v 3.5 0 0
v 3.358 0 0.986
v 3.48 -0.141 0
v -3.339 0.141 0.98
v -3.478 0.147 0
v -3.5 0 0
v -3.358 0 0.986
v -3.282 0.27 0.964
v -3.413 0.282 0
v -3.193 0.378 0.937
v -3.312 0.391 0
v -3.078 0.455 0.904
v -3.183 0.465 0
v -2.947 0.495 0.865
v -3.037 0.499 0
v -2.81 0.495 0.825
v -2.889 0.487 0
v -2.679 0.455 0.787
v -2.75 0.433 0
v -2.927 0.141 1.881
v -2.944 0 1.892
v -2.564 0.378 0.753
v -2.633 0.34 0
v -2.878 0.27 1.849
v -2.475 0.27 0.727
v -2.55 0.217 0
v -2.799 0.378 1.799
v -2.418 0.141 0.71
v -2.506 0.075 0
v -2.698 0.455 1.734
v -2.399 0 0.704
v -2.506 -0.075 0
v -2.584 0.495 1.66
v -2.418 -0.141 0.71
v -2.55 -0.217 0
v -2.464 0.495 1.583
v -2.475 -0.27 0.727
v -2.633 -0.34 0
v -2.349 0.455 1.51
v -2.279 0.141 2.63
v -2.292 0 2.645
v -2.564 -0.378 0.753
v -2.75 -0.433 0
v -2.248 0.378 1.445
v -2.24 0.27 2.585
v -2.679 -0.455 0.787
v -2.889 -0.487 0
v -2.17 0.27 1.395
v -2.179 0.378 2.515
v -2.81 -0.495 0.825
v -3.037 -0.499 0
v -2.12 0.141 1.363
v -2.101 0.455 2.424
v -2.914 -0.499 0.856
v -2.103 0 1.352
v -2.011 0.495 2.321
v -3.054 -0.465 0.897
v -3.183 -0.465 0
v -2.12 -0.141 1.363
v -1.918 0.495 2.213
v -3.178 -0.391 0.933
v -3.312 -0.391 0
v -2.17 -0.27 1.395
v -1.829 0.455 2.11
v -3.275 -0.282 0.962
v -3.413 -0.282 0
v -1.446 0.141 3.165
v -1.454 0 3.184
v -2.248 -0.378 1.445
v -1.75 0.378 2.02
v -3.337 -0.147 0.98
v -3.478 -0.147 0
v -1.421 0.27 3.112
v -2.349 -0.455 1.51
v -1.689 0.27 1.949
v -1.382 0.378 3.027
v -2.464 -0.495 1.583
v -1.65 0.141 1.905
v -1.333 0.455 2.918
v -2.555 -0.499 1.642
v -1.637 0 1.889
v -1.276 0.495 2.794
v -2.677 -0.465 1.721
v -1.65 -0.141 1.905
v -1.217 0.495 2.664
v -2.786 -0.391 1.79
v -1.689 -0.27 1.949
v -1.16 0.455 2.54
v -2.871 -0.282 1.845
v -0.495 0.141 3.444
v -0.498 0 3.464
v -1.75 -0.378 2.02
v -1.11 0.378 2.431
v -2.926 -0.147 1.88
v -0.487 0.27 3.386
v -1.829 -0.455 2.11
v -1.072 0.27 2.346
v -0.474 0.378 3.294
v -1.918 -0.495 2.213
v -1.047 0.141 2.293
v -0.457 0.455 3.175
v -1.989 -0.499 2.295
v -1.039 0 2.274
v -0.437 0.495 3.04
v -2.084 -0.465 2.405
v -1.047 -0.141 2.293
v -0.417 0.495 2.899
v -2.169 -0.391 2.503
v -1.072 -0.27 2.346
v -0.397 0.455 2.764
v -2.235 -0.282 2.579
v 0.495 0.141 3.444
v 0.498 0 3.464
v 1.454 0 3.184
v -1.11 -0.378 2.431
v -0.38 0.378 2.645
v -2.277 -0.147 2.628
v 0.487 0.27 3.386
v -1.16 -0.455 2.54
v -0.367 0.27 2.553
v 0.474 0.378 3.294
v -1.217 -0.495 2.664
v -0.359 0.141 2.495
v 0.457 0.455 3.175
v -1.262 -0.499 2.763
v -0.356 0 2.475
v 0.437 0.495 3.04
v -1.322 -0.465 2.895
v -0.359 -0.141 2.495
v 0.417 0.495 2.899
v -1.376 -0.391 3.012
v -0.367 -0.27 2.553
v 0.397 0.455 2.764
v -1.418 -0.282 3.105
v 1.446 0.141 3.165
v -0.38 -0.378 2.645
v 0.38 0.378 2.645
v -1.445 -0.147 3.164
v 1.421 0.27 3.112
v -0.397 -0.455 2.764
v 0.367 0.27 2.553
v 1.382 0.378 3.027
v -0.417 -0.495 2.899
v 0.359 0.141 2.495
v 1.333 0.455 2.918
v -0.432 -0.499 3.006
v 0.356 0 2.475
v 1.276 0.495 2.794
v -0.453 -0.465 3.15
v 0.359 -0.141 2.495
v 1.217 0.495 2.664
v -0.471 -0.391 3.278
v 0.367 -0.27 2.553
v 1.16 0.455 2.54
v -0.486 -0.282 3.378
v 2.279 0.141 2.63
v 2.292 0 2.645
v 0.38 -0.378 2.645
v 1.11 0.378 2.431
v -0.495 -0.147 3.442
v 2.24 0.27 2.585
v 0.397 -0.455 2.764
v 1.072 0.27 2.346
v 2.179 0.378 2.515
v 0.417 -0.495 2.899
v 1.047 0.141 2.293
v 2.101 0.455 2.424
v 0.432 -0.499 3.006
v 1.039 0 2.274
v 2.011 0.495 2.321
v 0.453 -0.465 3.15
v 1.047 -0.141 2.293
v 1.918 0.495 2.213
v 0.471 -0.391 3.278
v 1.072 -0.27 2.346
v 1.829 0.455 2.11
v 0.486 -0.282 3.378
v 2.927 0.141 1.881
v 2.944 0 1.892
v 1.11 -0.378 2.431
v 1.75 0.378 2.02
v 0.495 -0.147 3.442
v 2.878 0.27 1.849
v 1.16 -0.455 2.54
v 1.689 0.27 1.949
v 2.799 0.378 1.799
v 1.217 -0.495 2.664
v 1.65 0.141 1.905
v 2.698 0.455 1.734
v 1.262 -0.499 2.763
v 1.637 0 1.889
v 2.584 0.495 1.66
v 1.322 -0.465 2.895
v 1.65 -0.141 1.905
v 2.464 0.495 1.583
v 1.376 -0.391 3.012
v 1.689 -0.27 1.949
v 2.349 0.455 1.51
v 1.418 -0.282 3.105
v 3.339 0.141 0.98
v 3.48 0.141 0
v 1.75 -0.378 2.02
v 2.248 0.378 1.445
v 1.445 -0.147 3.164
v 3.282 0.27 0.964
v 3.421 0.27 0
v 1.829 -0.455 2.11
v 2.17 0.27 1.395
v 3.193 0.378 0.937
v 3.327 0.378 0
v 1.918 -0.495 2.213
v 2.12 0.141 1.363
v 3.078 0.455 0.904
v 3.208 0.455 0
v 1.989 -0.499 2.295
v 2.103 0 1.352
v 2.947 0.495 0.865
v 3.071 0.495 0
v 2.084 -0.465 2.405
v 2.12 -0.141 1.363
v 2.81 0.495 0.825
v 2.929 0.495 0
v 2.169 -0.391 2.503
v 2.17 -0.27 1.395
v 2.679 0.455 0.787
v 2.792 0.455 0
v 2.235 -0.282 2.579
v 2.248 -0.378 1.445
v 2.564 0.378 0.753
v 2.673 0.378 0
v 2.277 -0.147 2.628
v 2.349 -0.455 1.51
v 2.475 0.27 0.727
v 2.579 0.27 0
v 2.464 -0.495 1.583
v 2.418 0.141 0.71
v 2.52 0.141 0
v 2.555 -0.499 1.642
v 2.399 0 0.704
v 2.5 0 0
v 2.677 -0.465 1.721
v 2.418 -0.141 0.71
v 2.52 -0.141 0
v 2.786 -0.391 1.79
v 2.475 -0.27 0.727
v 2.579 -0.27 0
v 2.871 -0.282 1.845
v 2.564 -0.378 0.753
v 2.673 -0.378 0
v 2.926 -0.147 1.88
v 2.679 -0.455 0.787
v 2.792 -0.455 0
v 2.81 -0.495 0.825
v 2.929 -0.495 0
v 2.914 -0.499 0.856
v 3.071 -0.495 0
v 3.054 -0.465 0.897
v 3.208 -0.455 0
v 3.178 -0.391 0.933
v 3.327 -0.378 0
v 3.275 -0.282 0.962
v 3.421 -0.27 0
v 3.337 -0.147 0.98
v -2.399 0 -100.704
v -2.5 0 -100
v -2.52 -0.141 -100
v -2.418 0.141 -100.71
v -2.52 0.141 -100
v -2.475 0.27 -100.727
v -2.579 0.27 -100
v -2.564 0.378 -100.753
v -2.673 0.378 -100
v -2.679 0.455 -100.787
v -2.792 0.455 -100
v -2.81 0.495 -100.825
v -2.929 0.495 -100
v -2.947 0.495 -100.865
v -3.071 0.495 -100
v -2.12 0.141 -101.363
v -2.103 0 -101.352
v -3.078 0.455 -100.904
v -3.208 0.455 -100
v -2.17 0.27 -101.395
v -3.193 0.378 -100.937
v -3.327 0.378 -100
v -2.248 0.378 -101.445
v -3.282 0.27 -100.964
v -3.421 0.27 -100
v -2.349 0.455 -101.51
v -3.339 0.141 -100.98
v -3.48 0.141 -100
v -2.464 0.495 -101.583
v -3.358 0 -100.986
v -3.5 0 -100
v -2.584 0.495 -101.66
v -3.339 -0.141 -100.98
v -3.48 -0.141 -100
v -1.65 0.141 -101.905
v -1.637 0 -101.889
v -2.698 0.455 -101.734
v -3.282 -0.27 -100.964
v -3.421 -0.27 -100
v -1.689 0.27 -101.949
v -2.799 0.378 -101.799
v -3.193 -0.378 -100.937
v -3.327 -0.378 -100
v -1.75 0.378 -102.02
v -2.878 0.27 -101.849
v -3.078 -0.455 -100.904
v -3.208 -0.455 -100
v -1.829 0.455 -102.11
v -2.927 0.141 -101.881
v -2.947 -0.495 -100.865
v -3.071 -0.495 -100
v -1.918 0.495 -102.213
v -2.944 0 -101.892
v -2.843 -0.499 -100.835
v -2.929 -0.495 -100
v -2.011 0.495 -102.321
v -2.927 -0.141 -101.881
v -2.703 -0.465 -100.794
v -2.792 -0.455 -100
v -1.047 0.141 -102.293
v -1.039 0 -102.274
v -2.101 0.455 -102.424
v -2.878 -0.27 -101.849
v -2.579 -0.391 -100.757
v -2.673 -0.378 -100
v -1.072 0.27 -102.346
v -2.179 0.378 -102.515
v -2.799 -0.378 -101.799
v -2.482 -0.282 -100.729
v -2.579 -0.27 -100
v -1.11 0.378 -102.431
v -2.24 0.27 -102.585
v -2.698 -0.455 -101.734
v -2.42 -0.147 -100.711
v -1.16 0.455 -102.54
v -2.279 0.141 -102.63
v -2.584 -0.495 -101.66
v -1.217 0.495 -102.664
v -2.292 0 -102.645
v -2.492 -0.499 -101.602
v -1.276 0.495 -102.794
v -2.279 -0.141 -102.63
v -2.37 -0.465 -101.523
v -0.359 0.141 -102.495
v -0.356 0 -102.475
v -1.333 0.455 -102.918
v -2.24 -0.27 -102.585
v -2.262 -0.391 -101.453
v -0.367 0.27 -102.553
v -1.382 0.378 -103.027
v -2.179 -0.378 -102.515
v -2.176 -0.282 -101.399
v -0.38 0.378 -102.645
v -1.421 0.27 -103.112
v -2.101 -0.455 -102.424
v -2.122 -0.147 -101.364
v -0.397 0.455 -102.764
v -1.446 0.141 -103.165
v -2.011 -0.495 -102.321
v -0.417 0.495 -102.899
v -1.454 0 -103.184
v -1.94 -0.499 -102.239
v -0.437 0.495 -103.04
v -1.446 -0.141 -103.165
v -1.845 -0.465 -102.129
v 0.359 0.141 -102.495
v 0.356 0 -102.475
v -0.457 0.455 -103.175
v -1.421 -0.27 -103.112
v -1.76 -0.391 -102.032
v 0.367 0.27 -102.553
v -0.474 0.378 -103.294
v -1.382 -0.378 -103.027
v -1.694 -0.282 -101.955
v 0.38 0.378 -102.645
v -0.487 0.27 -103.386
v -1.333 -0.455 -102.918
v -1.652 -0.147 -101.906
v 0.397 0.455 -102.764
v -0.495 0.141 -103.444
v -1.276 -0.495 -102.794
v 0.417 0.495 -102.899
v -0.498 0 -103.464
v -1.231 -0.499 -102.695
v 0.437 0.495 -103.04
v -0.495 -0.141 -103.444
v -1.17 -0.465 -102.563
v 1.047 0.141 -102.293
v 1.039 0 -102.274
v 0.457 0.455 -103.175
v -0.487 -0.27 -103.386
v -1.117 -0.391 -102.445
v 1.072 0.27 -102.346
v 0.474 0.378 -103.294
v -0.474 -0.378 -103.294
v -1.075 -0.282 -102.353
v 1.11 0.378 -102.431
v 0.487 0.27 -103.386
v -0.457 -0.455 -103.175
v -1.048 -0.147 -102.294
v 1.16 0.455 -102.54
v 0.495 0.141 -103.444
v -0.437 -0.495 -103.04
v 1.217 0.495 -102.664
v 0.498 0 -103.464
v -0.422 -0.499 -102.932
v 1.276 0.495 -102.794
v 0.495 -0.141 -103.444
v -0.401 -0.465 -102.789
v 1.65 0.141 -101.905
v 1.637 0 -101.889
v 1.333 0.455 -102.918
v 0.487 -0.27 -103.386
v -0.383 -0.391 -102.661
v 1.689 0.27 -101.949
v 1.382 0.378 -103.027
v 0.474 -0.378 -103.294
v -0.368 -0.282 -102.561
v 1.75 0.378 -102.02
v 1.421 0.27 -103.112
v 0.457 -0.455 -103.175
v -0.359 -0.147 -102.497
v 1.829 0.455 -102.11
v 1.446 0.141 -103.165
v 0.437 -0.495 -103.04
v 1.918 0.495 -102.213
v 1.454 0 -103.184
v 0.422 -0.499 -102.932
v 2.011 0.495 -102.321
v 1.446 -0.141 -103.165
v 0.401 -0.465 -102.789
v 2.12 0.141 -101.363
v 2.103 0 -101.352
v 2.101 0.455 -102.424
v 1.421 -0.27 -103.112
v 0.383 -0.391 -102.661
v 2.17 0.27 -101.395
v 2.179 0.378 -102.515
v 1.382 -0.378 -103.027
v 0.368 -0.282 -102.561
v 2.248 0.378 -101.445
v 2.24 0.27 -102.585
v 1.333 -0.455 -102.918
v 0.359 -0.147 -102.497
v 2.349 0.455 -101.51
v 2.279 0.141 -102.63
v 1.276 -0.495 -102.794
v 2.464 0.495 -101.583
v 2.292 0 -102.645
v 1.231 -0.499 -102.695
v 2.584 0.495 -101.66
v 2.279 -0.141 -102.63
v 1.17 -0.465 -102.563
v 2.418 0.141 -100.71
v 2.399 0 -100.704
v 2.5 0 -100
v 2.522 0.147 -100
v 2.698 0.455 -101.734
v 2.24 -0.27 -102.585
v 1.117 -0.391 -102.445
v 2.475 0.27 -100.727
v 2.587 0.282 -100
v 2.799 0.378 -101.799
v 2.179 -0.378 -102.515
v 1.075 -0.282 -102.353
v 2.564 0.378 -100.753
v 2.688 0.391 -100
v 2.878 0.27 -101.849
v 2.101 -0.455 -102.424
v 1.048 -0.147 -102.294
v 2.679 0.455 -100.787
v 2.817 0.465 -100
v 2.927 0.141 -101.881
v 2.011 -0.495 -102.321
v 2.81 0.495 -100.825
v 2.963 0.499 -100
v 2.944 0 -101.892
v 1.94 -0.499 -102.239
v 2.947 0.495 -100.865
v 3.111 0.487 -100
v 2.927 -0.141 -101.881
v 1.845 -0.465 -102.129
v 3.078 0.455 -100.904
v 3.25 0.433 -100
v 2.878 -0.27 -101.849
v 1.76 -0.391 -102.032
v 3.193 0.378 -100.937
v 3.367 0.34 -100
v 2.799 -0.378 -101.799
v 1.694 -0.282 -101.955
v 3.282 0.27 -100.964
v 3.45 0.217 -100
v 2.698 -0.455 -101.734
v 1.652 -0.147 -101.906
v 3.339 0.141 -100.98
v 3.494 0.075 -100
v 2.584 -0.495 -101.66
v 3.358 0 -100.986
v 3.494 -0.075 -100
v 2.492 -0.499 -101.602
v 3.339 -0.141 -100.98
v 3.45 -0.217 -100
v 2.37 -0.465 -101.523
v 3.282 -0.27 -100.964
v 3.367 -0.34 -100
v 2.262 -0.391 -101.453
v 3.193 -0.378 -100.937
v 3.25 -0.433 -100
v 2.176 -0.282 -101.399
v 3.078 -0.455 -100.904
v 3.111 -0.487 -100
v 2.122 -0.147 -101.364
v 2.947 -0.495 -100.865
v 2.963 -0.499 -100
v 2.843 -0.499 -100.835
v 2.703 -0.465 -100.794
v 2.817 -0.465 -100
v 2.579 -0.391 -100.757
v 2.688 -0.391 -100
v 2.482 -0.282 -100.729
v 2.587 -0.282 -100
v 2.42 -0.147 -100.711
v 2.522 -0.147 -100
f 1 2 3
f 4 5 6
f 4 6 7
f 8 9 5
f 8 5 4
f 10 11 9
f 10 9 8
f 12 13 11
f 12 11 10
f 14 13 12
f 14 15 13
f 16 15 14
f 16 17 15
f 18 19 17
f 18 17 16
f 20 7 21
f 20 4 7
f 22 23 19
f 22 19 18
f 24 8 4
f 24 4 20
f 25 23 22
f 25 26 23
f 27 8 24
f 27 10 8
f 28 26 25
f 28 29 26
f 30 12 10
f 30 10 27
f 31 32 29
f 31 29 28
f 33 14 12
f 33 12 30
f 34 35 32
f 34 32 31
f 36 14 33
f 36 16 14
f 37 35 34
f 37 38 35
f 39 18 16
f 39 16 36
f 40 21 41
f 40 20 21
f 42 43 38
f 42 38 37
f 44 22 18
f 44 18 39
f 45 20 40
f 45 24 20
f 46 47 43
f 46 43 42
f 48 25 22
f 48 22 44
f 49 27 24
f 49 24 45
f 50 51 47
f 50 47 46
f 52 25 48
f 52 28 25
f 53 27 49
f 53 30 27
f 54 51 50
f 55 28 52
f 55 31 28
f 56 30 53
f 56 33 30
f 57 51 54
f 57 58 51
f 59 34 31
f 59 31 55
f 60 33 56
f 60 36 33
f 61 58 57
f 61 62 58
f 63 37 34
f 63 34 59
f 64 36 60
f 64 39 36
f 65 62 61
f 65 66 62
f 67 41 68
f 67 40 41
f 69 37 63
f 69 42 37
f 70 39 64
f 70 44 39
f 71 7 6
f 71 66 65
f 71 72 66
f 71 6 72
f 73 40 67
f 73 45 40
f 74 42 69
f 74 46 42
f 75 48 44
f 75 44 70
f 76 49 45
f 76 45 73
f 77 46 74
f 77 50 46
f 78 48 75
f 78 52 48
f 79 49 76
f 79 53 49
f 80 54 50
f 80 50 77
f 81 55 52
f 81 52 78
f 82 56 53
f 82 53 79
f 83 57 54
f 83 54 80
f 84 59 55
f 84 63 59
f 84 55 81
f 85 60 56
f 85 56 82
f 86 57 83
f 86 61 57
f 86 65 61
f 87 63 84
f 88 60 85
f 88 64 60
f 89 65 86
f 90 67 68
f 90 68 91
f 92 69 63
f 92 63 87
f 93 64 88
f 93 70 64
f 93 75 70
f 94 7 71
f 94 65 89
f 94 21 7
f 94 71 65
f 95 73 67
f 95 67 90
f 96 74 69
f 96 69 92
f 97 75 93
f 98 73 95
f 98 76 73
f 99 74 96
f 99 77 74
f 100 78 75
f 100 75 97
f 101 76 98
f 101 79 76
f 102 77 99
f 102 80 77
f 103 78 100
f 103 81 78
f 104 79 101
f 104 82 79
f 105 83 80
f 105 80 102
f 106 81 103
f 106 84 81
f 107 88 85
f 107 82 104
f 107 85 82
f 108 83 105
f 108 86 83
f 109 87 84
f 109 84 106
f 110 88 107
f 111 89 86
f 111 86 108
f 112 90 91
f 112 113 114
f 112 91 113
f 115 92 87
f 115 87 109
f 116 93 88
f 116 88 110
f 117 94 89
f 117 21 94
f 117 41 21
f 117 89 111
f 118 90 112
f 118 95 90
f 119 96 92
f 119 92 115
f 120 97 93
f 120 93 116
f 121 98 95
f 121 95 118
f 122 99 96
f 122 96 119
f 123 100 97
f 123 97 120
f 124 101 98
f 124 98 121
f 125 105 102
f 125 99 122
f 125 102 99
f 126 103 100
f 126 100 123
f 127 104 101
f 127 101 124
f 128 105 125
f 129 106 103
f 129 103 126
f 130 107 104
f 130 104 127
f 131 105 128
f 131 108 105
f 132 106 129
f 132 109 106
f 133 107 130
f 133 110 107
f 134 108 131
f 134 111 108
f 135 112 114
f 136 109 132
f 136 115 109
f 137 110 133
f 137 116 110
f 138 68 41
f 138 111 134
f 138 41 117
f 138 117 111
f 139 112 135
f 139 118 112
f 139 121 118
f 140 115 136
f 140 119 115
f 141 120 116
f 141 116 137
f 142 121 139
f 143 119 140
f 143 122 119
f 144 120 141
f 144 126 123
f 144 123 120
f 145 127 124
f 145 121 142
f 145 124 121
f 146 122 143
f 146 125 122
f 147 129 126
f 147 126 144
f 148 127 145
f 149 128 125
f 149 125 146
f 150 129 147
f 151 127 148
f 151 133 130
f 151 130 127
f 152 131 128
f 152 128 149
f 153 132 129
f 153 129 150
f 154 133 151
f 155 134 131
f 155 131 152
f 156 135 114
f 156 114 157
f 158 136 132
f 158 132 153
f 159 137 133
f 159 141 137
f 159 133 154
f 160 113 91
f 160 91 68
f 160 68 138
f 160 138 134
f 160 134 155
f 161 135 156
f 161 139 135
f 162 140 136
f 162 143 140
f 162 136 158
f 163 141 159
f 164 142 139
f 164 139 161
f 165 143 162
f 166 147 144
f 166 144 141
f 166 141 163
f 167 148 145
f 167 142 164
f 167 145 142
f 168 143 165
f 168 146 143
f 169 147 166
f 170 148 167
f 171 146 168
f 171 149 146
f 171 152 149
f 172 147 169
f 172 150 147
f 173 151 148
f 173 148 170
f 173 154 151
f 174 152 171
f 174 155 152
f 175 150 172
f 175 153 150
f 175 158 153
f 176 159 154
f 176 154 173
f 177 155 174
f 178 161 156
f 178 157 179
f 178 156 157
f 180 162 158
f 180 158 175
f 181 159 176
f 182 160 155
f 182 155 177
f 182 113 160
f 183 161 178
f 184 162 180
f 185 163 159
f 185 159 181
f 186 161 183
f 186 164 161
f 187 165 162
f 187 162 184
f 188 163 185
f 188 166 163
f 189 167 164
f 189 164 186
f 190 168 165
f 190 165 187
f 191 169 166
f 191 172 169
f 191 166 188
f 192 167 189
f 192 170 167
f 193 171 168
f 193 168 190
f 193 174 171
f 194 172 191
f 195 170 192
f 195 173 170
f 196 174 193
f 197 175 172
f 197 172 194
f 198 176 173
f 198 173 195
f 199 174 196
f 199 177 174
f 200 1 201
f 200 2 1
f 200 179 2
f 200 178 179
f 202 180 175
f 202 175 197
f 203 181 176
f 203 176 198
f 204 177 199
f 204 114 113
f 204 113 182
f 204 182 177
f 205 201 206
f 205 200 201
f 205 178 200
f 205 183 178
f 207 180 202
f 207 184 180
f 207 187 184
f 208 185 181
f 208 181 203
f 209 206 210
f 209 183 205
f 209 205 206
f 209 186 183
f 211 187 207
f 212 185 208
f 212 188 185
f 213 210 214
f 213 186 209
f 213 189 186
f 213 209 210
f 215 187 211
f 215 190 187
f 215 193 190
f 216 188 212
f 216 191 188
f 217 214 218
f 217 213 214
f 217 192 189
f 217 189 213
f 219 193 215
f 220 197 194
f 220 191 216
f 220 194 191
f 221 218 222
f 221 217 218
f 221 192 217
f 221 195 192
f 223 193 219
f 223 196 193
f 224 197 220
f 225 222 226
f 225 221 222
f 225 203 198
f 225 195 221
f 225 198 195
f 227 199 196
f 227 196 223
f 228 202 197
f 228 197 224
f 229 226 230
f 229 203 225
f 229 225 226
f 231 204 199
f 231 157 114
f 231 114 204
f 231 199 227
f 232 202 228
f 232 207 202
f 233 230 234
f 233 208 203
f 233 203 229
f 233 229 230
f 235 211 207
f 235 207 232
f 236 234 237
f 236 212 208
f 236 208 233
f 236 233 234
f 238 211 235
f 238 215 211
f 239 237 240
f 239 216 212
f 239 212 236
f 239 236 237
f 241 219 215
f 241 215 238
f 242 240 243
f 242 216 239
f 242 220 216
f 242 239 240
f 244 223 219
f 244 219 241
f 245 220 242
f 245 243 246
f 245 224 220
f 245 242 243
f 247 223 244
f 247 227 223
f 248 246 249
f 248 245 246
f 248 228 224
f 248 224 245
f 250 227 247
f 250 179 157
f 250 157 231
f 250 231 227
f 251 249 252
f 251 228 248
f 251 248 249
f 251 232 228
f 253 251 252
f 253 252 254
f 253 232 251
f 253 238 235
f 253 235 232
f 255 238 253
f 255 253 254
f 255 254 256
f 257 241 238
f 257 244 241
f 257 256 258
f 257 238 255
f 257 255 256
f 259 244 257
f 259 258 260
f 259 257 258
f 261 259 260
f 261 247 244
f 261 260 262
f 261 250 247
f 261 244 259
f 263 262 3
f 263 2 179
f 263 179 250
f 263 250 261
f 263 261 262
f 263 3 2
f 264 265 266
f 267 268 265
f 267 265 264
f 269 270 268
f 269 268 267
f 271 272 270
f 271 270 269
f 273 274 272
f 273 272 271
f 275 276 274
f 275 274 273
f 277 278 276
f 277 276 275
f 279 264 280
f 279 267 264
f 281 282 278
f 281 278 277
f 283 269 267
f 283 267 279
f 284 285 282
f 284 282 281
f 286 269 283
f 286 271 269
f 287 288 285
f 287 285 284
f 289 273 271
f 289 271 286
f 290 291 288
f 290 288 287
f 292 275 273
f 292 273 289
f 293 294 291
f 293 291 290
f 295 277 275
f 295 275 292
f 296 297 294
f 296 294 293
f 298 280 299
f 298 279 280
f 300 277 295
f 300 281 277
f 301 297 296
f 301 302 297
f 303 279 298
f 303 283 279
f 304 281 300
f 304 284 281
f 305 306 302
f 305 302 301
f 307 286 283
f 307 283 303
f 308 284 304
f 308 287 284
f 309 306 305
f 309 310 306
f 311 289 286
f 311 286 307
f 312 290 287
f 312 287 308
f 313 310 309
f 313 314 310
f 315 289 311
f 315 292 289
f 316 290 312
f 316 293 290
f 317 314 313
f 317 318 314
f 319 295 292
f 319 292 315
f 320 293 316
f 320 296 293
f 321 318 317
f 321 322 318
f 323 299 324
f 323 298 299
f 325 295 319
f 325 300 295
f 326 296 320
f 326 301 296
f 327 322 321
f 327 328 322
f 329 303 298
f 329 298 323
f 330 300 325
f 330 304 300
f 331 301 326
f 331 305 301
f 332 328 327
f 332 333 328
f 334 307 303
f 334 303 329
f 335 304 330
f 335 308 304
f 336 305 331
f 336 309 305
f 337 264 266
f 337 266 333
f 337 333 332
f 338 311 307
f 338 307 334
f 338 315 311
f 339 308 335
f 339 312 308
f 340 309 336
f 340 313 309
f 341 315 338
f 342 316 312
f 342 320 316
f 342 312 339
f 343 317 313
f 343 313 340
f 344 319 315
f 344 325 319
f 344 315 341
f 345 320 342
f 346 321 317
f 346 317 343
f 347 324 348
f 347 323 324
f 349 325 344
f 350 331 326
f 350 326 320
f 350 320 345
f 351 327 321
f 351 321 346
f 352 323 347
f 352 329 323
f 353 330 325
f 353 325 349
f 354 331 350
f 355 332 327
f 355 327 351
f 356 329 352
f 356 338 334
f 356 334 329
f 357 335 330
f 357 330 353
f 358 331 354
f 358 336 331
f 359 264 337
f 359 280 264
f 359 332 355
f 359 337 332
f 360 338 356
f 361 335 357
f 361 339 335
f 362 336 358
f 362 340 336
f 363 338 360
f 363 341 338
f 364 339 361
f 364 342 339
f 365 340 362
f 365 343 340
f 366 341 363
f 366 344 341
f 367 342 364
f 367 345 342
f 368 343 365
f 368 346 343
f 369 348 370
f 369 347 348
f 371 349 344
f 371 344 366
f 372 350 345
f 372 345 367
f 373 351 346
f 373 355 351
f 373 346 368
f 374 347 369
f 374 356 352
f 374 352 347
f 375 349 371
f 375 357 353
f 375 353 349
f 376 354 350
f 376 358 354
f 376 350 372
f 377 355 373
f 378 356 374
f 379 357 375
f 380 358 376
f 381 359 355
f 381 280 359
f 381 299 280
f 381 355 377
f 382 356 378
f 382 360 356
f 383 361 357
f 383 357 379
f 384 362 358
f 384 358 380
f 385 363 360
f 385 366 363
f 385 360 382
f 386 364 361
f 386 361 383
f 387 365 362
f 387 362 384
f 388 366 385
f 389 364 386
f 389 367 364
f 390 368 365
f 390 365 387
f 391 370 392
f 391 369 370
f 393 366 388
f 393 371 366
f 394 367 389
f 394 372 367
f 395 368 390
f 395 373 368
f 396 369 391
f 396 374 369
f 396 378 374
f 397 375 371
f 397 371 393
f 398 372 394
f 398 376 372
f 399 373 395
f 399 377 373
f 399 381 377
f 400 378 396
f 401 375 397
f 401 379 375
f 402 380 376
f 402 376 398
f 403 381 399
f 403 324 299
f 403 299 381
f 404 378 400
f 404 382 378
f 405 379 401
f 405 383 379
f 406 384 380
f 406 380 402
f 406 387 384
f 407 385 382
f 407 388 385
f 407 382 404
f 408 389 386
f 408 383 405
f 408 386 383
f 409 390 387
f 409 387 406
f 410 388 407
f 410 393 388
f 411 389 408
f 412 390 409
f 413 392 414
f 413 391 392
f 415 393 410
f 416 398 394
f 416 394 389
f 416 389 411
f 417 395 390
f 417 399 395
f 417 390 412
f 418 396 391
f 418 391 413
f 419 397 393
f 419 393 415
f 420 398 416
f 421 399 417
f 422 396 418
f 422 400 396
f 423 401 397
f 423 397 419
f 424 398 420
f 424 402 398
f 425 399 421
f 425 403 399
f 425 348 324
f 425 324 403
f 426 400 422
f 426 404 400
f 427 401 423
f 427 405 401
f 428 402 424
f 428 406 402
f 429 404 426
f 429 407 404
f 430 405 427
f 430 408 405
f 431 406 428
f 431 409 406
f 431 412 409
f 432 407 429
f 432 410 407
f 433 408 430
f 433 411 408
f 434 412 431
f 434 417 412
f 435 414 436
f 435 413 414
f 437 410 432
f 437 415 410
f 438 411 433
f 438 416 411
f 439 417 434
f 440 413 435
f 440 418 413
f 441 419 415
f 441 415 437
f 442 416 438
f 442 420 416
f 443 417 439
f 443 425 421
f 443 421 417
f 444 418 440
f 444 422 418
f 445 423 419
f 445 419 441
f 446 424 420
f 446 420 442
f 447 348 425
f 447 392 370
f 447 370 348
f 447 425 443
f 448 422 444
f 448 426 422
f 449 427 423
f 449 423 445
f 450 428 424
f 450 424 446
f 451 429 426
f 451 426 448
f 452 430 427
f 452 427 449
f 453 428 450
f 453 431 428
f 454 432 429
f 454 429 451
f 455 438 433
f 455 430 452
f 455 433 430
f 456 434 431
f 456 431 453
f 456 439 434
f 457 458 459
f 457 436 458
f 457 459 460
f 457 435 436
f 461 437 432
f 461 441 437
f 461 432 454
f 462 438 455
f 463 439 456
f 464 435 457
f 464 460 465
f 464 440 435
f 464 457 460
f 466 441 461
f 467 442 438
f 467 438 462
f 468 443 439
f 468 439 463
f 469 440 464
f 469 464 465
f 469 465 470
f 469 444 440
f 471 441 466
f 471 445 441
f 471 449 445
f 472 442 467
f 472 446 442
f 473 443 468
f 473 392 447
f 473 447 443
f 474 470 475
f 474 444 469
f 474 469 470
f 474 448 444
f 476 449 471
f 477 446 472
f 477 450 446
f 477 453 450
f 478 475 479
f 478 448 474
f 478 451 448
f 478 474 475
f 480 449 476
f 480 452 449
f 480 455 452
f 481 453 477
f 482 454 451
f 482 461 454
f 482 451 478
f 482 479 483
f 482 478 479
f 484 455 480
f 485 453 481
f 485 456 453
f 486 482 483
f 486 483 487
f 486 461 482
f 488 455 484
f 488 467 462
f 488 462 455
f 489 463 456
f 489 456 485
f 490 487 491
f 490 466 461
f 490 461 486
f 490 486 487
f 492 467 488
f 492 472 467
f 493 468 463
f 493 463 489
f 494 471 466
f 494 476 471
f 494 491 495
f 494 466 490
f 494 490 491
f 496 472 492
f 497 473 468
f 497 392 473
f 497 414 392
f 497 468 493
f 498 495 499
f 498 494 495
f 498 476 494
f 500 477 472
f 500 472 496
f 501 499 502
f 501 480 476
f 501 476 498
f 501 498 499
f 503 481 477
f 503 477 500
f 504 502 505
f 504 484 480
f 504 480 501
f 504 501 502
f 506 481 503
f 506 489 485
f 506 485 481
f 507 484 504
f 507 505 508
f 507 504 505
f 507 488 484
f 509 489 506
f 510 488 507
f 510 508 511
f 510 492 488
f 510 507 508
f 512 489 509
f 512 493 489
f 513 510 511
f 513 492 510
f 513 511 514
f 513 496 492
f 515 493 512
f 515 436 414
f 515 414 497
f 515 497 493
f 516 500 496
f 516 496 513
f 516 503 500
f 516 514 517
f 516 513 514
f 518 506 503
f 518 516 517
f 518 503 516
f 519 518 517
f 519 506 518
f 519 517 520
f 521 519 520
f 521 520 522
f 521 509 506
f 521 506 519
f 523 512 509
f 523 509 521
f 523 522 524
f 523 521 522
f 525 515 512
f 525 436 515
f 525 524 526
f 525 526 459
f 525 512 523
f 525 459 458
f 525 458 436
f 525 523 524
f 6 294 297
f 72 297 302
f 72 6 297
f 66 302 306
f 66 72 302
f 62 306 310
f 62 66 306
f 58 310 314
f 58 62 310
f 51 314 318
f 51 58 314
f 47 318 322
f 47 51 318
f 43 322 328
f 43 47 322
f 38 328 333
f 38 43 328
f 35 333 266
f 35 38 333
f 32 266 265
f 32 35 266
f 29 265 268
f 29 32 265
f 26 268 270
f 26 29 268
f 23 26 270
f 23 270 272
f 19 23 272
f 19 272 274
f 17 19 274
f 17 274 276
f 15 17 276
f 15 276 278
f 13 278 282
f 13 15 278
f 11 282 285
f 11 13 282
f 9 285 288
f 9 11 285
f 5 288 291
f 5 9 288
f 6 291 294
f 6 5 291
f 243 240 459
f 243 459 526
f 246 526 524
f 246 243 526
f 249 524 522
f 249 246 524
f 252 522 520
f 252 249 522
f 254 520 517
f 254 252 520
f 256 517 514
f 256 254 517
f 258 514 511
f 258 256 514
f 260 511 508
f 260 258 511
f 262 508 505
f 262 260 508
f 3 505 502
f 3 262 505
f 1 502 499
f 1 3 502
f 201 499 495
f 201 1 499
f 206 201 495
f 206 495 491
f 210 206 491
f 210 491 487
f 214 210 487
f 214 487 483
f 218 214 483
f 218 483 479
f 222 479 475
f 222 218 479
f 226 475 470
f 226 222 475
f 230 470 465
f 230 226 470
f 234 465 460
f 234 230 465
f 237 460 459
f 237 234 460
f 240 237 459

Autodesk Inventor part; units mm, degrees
ref_plane "YZ Plane" through (0, 0, 0) normal (1, 0, 0) x (0, 1, 0)
ref_plane "XZ Plane" through (0, 0, 0) normal (0, 1, 0) x (-1, 0, 0)
ref_plane "XY Plane" through (0, 0, 0) normal (0, 0, 1) x (1, 0, 0)
sketch "Sketch5" plane through (0, 0, 0) normal (0, 0, 1) x (1, 0, 0)
  circle A0 centre (3, 0) radius 0.5
  line L0 (0, -0.7) -> (0, 0.7) projected
  point P0 (0, 0)
  dimension "d8" = 1
  dimension "d9" = 3
revolve "Revolution1" add sketch "Sketch5" angle 180 about axis through (0, -10, 0) along (0, -1, 0)
sketch "Sketch6" plane through (3, 0, 0) normal (0, 0, -1) x (-1, 0, 0)
  circle A0 centre (0, 0) radius 0.5 projected
  circle A1 centre (6, 0) radius 0.5 projected
  point P0 (3, 0)
extrude "Extrusion1" add sketch "Sketch6" along normal blind 100
sketch "Sketch7" plane through (3, 0, -100) normal (0, 0, -1) x (-1, 0, 0)
  circle A0 centre (0, 0) radius 0.5 projected
  line L0 (3, -0.7) -> (3, 0.7) projected
  point P0 (3, 0)
revolve "Revolution2" add sketch "Sketch7" angle 180 about axis through (0, -10, -100) along (0, 1, 0)
properties part number "Rope"
